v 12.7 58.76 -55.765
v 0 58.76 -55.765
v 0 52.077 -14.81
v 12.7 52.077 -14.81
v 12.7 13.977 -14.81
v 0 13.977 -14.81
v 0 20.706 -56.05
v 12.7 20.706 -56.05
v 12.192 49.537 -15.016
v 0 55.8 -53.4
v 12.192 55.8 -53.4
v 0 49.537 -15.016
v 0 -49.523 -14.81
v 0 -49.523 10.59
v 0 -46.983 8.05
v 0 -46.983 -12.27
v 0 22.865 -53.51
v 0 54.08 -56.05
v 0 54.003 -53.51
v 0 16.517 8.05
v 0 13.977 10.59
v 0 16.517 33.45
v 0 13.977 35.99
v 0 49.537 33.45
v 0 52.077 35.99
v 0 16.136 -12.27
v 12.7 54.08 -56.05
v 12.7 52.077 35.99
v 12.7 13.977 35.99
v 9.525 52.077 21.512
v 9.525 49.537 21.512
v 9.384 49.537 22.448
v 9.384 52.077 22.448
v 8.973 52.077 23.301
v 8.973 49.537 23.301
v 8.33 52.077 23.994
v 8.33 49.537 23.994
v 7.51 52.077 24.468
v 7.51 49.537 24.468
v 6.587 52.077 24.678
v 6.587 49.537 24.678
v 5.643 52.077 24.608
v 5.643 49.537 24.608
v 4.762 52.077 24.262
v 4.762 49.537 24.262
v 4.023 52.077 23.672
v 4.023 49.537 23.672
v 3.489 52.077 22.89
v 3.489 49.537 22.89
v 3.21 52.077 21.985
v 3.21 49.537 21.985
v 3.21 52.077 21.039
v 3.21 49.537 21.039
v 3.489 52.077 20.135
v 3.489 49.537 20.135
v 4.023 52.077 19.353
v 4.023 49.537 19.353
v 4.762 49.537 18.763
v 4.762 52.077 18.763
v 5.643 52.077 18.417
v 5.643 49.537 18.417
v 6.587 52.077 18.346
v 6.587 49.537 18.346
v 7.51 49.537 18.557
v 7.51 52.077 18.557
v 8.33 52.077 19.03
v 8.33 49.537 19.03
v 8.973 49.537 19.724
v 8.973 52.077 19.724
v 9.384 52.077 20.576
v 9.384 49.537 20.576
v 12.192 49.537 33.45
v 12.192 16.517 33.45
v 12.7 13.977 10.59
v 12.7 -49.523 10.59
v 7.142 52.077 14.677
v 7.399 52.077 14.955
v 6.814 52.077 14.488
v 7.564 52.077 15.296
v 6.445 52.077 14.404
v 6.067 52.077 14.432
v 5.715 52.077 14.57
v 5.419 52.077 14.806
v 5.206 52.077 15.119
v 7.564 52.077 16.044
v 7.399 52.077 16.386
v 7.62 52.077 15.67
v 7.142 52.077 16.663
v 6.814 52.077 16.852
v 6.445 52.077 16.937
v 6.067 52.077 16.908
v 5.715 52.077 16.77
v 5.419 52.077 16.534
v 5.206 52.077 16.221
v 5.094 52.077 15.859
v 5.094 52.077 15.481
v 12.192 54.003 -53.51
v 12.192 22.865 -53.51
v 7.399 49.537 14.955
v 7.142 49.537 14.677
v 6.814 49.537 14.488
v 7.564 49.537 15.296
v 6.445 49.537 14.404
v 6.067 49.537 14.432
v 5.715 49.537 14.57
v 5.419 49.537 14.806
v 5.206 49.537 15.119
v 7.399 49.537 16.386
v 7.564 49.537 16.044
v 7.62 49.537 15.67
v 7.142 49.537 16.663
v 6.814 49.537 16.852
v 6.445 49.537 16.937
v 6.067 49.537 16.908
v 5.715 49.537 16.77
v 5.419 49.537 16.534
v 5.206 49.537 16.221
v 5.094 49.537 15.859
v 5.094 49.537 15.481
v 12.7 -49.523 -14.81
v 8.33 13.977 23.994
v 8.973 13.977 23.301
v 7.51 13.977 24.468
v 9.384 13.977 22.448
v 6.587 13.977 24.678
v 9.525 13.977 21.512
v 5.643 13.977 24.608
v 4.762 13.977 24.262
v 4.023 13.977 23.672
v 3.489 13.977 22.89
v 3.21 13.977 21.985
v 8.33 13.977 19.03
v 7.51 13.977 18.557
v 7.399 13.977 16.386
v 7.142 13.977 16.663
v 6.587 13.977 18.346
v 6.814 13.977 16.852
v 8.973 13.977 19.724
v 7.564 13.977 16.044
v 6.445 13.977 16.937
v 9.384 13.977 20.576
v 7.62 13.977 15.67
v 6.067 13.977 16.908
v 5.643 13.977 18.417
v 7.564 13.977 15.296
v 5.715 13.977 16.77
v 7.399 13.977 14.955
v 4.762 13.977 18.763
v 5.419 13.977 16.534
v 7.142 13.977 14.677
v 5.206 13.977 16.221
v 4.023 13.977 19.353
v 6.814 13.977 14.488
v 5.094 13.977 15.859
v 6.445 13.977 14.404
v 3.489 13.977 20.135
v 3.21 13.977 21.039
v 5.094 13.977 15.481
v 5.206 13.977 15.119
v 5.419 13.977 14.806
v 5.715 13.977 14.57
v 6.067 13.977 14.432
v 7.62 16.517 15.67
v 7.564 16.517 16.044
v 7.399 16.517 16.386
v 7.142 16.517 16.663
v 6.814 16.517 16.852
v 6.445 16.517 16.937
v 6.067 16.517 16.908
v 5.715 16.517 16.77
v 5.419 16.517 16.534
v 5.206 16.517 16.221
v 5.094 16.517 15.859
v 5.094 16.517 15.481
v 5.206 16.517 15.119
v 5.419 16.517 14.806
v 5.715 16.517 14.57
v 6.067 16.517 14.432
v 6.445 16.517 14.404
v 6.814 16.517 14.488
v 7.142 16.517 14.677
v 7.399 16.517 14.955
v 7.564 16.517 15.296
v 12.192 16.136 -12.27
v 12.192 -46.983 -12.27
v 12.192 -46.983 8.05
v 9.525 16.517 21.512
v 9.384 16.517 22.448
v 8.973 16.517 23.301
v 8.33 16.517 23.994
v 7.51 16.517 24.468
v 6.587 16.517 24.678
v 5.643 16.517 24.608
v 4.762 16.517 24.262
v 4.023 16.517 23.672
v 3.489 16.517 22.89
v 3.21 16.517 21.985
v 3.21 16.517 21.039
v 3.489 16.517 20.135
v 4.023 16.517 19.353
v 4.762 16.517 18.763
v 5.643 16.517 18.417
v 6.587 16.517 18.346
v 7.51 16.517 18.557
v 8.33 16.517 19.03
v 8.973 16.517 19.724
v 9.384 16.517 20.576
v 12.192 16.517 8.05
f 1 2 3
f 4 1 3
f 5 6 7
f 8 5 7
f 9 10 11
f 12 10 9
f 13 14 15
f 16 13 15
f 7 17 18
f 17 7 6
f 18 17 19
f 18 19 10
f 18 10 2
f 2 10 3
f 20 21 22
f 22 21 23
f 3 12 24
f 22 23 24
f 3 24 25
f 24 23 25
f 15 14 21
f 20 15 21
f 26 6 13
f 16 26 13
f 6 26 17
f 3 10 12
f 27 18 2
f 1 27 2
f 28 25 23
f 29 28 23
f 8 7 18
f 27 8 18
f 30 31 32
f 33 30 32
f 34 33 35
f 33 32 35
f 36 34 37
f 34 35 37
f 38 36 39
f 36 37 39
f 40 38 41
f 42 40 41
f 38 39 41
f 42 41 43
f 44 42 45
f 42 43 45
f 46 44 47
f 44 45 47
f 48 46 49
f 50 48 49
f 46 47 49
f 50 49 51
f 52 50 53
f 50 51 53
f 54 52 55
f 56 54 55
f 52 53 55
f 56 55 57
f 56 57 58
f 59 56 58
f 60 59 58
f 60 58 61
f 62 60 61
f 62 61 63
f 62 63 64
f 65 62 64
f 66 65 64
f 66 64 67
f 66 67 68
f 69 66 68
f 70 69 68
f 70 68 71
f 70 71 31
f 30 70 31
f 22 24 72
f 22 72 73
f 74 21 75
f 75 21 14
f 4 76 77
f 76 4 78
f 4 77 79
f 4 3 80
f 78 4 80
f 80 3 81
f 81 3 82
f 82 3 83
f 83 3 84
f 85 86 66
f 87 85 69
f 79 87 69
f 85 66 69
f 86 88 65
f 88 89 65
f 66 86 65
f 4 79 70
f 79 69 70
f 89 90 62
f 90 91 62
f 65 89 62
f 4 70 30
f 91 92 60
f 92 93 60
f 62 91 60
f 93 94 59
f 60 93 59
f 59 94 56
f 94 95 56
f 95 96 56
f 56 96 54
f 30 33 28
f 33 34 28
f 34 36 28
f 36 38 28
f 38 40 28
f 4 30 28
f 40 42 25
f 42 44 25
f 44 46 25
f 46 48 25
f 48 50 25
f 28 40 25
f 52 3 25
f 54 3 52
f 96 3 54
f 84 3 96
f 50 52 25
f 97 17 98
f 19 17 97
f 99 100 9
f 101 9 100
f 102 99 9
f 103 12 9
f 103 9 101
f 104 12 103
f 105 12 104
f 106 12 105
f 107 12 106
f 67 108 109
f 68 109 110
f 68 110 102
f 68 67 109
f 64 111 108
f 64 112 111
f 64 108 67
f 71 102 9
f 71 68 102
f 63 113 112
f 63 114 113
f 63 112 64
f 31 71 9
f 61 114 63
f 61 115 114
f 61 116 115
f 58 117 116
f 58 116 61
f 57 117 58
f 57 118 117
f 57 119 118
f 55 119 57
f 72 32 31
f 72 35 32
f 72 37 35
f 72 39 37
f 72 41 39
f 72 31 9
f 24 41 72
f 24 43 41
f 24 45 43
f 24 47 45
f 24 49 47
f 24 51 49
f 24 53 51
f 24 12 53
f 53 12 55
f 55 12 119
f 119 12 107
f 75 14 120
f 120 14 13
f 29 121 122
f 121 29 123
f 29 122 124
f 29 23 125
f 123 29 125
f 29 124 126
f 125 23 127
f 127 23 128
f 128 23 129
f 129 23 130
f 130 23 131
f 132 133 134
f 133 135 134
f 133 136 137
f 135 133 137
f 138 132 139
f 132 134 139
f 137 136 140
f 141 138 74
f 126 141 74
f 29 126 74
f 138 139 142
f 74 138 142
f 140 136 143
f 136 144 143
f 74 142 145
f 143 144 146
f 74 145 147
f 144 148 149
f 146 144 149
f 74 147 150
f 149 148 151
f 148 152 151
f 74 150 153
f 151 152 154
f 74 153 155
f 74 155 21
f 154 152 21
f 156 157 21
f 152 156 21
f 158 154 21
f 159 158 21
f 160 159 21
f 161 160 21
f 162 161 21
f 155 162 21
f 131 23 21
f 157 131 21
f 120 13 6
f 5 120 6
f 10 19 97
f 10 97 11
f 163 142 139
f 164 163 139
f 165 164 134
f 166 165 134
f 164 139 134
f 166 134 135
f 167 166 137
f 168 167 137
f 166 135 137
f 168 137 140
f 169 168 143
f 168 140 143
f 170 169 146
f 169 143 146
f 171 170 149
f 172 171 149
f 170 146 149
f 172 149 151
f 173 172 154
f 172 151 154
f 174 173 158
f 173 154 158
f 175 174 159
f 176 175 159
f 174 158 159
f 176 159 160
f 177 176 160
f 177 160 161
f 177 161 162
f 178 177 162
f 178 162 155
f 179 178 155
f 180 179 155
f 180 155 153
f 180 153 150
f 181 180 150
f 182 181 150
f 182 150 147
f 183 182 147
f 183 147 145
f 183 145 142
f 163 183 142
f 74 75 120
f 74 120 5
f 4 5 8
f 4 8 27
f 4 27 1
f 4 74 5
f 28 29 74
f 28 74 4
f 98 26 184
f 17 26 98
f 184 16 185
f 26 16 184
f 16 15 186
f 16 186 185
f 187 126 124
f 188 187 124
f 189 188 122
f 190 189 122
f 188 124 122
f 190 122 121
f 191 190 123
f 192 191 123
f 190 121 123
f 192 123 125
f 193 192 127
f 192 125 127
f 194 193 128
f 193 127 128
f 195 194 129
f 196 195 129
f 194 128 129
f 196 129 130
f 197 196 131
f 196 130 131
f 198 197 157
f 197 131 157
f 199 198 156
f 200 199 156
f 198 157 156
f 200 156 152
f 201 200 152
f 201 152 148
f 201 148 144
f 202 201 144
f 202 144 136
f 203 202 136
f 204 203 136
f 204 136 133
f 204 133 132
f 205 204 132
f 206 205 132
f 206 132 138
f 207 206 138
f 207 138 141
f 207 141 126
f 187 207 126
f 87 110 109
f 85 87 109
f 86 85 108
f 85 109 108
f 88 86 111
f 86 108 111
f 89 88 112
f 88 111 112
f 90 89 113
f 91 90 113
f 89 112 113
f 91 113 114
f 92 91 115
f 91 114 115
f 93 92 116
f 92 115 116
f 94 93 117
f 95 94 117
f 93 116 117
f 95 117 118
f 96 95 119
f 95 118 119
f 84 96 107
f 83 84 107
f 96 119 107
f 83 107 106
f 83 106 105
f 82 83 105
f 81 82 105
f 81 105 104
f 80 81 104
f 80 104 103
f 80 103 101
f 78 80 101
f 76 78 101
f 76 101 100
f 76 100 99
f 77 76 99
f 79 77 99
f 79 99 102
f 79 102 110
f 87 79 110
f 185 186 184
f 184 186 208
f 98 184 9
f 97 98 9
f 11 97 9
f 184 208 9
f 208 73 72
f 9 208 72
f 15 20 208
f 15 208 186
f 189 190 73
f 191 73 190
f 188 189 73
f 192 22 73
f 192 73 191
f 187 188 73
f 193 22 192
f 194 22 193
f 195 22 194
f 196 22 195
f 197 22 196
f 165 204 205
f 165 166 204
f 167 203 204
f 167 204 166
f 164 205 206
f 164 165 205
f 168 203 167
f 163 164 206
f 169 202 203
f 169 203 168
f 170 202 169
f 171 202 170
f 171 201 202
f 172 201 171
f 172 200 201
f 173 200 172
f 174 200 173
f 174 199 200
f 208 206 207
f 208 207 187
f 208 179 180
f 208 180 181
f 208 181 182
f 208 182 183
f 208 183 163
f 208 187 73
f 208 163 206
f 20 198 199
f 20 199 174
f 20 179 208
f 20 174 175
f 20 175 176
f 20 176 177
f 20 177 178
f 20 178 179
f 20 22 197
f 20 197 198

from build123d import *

# Parameters (mm, degrees)
F2_DEPTH = 12.7
F3_DEPTH = 12.192
F4_R     = 1.27
F5_DEPTH = 38.23583
F6_R     = 3.175
F7_DEPTH = 38.23239


with BuildPart() as f2:
    # F0 (on Right) → F2 (new body)
    with BuildSketch(Plane.YZ):
        Polygon((13.97679, 10.59016), (-49.52321, 10.59016), (-49.52321, -14.80984), (13.97679, -14.80984), (20.706118, -56.049787), (54.080267, -56.049787), (58.759574, -55.764545), (52.07679, -14.80984), (52.07679, 10.59016), (52.07679, 35.99016), (13.97679, 35.99016), align=None)
    extrude(amount=F2_DEPTH)

    # F1 (on Right) → F3 (cut)
    with BuildSketch(Plane.YZ):
        Polygon((16.135918, -12.26984), (22.865247, -53.509787), (54.002922, -53.509787), (55.800184, -53.400229), (49.53679, -15.01571), (49.53679, 10.59016), (49.53679, 33.45016), (16.51679, 33.45016), (16.51679, 8.05016), (-46.98321, 8.05016), (-46.98321, -12.26984), align=None)
    extrude(amount=F3_DEPTH, mode=Mode.SUBTRACT)

    # F4 (on face) → F5 (cut)
    with BuildSketch(Plane.XZ.offset(-13.97679)):
        with Locations((6.35, 15.67016)):
            Circle(F4_R)
    extrude(amount=-F5_DEPTH, mode=Mode.SUBTRACT)

    # F6 (on face) → F7 (cut)
    with BuildSketch(Plane.XZ.offset(-13.97679)):
        with Locations((6.35, 21.51216)):
            Circle(F6_R)
    extrude(amount=-F7_DEPTH, mode=Mode.SUBTRACT)


solid = f2.part
